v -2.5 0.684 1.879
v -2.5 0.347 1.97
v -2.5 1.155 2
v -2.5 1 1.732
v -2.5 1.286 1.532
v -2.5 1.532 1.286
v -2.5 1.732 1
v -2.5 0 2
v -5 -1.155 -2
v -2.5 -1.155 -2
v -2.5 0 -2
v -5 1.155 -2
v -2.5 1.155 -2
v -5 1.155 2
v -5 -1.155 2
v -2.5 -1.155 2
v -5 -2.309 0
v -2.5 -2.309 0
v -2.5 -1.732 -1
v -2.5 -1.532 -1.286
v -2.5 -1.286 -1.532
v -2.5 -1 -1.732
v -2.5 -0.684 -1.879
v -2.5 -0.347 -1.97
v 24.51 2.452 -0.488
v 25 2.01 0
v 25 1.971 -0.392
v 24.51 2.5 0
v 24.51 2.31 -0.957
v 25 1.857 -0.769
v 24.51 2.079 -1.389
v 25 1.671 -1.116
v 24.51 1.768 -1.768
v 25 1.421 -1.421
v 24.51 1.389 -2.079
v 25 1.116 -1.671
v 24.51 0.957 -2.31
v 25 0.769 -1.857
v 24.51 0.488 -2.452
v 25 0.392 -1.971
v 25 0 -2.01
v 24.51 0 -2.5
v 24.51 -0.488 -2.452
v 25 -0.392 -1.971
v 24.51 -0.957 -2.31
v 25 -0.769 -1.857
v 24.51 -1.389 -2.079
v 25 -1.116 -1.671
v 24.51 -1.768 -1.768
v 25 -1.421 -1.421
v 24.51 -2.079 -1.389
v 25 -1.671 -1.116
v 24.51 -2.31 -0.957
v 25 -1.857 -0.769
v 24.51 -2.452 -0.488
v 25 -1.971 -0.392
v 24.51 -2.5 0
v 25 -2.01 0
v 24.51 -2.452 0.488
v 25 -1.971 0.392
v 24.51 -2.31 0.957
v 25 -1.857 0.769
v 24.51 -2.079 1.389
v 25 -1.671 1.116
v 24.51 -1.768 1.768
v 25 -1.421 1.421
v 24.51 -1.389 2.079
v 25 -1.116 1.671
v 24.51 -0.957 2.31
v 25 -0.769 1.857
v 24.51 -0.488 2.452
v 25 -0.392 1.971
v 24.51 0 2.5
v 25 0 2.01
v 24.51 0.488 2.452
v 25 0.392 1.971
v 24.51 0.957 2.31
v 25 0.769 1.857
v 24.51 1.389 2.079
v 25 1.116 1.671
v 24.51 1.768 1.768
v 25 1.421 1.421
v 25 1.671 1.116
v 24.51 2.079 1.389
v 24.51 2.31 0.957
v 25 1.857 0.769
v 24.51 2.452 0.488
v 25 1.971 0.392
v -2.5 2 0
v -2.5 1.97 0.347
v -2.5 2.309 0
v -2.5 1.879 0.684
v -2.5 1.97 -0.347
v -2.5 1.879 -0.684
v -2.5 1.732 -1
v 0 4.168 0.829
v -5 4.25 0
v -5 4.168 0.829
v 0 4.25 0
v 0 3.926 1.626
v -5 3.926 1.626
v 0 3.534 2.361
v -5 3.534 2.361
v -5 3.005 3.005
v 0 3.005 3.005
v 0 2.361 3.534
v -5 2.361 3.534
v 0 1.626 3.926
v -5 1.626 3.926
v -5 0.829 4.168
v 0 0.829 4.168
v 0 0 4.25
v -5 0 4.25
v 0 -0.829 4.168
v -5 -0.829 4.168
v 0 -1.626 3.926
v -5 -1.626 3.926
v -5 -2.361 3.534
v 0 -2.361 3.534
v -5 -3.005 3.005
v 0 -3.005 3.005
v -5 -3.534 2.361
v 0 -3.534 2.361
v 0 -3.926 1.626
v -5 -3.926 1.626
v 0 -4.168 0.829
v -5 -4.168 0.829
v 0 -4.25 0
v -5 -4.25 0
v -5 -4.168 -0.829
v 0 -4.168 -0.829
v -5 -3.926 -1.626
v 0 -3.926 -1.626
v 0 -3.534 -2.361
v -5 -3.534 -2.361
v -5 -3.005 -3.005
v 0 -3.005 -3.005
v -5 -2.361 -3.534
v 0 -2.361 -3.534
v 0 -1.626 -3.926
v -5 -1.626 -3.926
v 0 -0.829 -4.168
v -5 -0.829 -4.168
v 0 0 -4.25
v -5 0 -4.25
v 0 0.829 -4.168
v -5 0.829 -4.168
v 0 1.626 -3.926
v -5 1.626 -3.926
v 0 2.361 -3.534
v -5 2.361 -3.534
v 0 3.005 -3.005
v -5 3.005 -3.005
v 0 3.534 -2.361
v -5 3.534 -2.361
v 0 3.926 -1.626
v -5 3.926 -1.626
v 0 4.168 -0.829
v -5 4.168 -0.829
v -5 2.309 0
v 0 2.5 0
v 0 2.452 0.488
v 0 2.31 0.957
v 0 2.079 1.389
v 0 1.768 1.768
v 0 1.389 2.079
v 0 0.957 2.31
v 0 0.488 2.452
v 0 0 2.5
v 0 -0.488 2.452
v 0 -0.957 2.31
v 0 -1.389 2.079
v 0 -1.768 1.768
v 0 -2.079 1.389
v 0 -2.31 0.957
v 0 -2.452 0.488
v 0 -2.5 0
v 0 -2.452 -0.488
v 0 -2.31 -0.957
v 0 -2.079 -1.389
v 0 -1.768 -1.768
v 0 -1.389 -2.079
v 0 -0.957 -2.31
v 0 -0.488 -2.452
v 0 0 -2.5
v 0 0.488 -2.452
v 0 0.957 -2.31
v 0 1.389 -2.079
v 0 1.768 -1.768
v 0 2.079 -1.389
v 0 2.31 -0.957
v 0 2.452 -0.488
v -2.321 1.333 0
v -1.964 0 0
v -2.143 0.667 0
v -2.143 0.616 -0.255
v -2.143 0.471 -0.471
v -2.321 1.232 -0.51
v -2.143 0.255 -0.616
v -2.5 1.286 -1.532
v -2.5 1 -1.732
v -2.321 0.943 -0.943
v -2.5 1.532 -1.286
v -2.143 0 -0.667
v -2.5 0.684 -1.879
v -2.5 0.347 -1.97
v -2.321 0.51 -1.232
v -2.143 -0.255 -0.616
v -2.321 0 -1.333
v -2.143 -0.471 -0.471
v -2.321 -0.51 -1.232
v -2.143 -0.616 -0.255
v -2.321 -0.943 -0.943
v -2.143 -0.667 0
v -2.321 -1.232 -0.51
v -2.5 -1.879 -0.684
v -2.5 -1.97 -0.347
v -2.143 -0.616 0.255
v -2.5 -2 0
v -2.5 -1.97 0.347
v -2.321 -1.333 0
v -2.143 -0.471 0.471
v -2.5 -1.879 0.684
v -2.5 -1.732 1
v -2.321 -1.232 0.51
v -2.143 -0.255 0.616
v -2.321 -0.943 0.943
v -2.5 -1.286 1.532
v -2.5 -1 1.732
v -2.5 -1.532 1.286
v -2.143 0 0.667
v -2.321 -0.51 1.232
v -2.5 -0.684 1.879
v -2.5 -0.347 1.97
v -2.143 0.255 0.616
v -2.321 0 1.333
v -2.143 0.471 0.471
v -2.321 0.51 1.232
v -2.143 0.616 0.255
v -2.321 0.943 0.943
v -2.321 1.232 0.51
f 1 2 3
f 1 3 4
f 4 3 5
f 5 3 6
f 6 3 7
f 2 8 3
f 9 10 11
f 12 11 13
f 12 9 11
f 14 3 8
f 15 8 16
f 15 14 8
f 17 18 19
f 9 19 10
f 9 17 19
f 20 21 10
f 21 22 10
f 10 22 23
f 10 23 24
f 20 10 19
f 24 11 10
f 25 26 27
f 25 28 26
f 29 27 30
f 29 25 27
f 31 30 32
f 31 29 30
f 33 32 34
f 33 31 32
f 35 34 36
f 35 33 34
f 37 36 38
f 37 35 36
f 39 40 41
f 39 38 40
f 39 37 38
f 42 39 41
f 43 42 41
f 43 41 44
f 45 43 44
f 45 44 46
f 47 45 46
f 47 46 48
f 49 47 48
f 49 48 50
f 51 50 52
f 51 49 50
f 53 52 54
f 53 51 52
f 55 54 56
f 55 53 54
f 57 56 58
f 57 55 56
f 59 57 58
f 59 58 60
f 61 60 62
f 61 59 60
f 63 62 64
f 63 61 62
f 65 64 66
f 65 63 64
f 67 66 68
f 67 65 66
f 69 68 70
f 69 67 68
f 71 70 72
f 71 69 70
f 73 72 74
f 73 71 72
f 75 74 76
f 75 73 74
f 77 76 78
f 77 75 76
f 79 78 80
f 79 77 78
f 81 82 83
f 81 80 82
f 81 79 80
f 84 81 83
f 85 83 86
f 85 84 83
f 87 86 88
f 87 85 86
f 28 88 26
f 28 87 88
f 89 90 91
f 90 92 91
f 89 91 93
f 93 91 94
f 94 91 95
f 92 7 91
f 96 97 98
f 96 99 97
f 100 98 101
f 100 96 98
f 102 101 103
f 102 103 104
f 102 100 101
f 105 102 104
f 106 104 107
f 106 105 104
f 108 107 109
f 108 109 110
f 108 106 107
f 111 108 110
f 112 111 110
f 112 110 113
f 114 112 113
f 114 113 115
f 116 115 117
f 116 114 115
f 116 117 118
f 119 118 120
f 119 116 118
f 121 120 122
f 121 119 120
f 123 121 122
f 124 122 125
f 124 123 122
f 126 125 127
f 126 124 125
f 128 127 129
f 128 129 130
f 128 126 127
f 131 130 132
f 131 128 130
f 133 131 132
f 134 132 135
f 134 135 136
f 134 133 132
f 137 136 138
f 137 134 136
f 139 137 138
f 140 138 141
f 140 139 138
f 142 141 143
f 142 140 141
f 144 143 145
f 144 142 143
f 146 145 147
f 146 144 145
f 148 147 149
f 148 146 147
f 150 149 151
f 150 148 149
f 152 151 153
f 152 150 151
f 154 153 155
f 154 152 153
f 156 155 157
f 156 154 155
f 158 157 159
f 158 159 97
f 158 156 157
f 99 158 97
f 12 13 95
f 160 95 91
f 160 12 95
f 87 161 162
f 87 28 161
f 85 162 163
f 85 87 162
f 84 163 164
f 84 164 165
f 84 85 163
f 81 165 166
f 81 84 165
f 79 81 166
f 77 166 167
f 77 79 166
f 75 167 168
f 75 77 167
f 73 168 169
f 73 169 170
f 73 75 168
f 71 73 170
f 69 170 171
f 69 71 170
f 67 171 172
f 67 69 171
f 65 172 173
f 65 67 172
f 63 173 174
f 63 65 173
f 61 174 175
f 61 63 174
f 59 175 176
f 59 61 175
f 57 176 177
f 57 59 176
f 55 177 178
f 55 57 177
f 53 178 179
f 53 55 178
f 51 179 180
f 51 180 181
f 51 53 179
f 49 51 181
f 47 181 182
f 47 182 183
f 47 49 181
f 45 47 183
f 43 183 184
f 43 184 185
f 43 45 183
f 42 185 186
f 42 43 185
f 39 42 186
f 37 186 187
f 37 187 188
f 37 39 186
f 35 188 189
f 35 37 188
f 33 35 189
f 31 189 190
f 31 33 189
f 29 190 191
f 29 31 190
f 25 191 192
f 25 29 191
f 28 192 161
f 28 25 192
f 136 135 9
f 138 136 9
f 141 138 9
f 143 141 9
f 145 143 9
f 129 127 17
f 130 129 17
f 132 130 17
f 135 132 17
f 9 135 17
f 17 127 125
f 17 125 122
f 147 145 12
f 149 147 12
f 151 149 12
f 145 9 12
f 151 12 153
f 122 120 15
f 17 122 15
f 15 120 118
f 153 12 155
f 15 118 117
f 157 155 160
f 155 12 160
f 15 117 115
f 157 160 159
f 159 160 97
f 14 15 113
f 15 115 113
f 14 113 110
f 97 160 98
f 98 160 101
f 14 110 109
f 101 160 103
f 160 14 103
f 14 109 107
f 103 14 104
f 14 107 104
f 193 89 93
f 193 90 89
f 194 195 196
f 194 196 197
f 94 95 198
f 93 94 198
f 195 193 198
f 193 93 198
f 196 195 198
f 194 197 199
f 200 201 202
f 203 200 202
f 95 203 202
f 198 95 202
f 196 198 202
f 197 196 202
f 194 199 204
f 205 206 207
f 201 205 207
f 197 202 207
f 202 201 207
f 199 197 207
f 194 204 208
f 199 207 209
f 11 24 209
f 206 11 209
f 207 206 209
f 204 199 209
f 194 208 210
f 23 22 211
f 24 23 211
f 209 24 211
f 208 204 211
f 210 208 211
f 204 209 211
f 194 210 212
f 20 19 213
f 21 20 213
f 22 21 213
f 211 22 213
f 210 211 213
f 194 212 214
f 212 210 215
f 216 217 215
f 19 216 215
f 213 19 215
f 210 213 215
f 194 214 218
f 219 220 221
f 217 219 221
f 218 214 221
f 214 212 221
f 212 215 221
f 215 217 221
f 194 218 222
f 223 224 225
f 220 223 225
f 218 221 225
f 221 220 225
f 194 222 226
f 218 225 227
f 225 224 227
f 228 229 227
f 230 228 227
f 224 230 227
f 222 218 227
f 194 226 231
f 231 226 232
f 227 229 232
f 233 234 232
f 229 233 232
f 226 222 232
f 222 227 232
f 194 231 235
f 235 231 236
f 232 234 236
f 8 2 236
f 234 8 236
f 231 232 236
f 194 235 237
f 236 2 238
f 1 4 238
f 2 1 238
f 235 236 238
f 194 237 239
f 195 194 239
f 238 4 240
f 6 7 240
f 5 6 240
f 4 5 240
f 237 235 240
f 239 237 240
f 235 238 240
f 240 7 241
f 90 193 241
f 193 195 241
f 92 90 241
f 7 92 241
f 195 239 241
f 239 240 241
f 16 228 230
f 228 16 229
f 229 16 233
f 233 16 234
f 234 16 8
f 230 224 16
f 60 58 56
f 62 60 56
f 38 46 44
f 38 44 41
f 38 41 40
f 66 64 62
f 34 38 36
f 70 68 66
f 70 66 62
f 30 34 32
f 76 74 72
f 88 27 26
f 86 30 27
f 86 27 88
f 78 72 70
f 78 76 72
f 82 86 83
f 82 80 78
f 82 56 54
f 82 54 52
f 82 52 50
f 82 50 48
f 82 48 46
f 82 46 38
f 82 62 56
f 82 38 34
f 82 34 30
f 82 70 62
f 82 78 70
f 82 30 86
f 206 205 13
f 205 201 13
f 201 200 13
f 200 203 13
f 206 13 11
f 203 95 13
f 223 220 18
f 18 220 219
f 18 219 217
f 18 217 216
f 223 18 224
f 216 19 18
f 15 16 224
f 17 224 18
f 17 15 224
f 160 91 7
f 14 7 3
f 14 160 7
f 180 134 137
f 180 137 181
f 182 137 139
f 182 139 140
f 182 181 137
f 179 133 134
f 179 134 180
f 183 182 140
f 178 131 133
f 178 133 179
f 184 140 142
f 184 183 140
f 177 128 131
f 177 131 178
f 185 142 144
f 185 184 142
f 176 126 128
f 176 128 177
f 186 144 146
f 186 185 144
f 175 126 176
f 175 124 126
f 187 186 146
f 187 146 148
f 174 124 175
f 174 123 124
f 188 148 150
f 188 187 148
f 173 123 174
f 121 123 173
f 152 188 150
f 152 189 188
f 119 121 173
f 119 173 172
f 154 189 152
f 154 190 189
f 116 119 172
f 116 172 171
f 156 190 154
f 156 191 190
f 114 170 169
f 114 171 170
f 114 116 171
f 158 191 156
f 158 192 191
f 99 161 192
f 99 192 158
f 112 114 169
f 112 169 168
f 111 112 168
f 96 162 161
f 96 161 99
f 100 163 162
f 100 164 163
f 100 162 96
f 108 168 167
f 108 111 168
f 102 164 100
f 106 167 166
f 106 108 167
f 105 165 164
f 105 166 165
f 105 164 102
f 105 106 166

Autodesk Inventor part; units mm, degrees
sketch "Sketch_1" plane through (0, 0, 0) normal (0, 0, 1) x (1, 0, 0)
  line L0 (25, 0) -> (-5, 0)
  line L1 (-5, 0) -> (-5, 4.25)
  line L2 (-5, 4.25) -> (0, 4.25)
  line L3 (0, 4.25) -> (0, 2.5)
  line L4 (0, 2.5) -> (24.5095, 2.5)
  line L5 (24.5095, 2.5) -> (25, 2.0095)
  line L6 (25, 2.0095) -> (25, 0)
  line L7 (25, 0) -> (-5, 0)
revolve "Revolution1" add sketch "Sketch_1" angle 360 about axis through (25, 0, 0) along (1, 0, 0)
thread "Thread1" size "M5x0.8" class "6g" standard "ISO Metric profile" length 24.5 offset 0.5
sketch "Sketch_4" plane through (0, 0, 0) normal (0, 0, 1) x (1, 0, 0)
  line L0 (-1.9641, 0) -> (-5, 0)
  line L1 (-5, 0) -> (-5, 2)
  line L2 (-5, 2) -> (-2.5, 2)
  line L3 (-2.5, 2) -> (-1.9641, 0)
  line L4 (-1.9641, 0) -> (-5, 0)
revolve "Revolution2" cut sketch "Sketch_4" angle 360 about axis through (-1.9641, 0, 0) along (1, 0, 0)
sketch "Sketch_3" plane through (-5, 0, 0) normal (1, 0, 0) x (0, 0, -1)
  line L0 (-2, 1.1547) -> (-2, -1.1547)
  line L1 (-2, -1.1547) -> (0, -2.3094)
  line L2 (0, -2.3094) -> (2, -1.1547)
  line L3 (2, -1.1547) -> (2, 1.1547)
  line L4 (2, 1.1547) -> (0, 2.3094)
  line L5 (0, 2.3094) -> (-2, 1.1547)
extrude "Extrusion1" cut sketch "Sketch_3" along normal blind 2.5
ref_plane "bolt_XY" through (0, 0, 0) normal (1, 0, 0) x (0, 0, -1)
ref_plane "bolt_YZ" through (0, 0, 0) normal (0, 0, -1) x (0, 1, 0)
ref_plane "bolt_ZX" through (0, 0, 0) normal (0, 1, 0) x (1, 0, 0)
ref_plane "nut_XY" through (25, 0, 0) normal (1, 0, 0) x (0, 0, -1)
ref_plane "nut_YZ" through (25, 0, 0) normal (0, 0, -1) x (0, 1, 0)
ref_plane "nut_ZX" through (25, 0, 0) normal (0, 1, 0) x (1, 0, 0)
properties part number "CBM5-25"
